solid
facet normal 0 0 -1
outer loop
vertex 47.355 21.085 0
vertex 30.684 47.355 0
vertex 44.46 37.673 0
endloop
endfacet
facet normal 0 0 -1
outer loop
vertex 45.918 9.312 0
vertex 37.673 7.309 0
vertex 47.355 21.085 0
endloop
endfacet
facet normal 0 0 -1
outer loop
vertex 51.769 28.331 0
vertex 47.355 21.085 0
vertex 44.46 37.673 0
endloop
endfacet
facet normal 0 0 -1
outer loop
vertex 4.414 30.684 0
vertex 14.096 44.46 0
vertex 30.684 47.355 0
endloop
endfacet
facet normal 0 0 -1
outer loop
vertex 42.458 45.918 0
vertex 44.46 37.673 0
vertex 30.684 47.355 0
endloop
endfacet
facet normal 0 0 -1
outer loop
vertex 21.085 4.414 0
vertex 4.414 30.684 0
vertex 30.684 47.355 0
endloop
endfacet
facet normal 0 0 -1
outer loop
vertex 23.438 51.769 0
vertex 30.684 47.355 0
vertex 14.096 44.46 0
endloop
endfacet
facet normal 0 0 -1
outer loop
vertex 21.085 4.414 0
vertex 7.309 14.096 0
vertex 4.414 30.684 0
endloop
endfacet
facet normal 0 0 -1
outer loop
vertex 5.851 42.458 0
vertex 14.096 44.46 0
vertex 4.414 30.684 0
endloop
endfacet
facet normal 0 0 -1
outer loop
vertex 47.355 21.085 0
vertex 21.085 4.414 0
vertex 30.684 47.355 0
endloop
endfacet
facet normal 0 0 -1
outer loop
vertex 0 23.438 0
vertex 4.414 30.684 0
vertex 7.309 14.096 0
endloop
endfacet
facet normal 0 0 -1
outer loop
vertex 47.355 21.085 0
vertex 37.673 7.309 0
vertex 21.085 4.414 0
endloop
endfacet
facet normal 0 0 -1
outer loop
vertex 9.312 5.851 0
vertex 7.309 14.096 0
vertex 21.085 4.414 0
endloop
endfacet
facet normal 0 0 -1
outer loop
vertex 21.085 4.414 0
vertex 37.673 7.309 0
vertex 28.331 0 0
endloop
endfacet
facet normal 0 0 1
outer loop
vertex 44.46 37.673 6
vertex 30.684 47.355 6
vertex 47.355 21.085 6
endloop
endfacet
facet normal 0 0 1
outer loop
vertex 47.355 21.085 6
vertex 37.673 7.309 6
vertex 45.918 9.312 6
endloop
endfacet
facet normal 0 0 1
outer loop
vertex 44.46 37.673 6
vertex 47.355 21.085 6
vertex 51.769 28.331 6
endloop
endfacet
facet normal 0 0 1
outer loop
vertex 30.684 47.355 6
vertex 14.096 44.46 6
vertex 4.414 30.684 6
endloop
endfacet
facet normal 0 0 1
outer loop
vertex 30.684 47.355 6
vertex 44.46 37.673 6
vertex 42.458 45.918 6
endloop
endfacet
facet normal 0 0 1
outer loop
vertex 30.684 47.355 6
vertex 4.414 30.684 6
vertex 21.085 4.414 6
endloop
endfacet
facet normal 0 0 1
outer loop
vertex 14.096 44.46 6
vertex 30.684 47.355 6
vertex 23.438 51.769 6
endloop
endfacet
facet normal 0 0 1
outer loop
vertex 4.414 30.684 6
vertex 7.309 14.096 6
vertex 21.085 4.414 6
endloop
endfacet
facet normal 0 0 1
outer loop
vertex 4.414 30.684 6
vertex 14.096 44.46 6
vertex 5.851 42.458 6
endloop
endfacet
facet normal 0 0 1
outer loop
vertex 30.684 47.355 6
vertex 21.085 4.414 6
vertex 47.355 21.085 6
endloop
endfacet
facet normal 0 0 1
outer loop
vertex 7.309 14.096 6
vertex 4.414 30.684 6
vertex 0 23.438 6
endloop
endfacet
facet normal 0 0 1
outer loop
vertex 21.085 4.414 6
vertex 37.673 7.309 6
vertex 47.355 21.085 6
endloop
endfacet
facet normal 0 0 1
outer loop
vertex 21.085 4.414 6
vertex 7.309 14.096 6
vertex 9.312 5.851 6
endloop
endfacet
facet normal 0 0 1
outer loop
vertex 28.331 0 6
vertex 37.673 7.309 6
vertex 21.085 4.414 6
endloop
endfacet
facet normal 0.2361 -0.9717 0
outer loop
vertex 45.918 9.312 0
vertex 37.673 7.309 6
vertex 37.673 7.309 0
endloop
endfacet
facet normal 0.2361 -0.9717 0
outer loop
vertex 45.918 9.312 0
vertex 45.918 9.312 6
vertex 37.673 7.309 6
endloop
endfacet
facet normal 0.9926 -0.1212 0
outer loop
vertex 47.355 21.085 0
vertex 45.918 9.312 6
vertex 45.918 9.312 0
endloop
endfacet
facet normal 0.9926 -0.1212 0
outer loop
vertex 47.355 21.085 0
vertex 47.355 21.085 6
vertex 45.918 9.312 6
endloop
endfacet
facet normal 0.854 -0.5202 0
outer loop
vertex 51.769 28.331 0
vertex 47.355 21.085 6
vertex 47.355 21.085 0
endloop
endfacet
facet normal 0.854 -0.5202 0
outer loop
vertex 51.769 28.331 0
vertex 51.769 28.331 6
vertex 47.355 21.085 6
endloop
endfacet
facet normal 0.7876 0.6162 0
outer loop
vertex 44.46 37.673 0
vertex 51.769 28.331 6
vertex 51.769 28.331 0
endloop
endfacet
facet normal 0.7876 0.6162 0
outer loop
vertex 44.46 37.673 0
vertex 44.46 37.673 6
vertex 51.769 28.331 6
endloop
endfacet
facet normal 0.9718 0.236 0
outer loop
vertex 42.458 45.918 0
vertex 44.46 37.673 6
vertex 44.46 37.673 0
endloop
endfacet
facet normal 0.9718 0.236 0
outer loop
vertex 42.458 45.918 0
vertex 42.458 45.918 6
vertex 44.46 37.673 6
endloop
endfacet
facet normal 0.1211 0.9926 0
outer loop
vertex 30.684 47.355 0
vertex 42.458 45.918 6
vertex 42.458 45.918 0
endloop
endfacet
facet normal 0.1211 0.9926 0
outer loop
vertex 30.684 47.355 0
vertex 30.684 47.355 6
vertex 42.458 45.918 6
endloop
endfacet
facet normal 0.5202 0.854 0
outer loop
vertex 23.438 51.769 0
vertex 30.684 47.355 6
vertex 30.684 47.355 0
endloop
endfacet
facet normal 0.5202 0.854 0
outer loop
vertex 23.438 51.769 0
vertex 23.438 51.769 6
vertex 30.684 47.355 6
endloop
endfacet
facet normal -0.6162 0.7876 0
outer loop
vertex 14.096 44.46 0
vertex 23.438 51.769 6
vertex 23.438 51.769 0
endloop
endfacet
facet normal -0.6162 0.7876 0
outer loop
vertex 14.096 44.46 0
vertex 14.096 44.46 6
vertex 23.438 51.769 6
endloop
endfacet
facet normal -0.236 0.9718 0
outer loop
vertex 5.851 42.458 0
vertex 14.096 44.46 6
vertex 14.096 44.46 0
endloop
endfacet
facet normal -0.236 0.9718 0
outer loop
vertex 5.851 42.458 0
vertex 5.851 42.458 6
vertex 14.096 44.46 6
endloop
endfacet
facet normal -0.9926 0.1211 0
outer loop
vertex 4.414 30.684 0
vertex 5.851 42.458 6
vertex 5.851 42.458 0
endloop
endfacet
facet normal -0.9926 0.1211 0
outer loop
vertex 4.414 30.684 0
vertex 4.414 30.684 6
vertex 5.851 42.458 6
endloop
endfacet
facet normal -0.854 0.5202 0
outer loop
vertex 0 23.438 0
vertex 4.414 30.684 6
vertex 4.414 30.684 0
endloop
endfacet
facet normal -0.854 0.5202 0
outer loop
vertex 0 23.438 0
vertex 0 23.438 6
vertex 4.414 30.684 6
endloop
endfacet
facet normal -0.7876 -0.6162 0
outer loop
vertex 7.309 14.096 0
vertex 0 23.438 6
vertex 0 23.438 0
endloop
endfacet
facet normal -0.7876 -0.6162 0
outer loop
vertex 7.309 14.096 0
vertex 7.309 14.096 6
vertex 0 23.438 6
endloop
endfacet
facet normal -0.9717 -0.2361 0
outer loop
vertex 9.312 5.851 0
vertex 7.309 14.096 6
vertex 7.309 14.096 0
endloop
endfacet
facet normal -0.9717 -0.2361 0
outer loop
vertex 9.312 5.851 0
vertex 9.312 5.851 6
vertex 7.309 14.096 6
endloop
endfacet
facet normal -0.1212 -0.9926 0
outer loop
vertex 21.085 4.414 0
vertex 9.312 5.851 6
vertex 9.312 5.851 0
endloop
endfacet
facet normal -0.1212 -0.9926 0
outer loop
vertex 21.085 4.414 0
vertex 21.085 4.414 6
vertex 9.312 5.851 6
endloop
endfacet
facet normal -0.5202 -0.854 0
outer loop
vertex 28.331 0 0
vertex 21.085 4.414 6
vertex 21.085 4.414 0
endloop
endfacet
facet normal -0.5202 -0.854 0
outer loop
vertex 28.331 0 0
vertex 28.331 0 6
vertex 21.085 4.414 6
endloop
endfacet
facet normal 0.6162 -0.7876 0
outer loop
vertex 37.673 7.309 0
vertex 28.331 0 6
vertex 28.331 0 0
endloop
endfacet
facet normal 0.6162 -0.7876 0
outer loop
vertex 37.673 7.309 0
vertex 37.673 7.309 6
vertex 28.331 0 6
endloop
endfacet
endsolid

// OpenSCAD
$fn = 32;

// ----------------------------------------------------------------------
// Chain sprocket: 8 teeth, 22 mm root radius
// ----------------------------------------------------------------------

// --- parameters (mm) ---
profile_height = 6;       // extrusion height
profile_points = 16;      // points of the closed outline

profile = [[47.355, 21.085], [51.769, 28.331], [44.46, 37.673], [42.458, 45.918], [30.684, 47.355], [23.438, 51.769], [14.096, 44.46], [5.851, 42.458], [4.414, 30.684], [0, 23.438], [7.309, 14.096], [9.312, 5.851], [21.085, 4.414], [28.331, 0], [37.673, 7.309], [45.918, 9.312]];  // single closed polygon, 16 points, counter clockwise

// --- the one profile operation ---
linear_extrude(height = profile_height) polygon(points = profile);
